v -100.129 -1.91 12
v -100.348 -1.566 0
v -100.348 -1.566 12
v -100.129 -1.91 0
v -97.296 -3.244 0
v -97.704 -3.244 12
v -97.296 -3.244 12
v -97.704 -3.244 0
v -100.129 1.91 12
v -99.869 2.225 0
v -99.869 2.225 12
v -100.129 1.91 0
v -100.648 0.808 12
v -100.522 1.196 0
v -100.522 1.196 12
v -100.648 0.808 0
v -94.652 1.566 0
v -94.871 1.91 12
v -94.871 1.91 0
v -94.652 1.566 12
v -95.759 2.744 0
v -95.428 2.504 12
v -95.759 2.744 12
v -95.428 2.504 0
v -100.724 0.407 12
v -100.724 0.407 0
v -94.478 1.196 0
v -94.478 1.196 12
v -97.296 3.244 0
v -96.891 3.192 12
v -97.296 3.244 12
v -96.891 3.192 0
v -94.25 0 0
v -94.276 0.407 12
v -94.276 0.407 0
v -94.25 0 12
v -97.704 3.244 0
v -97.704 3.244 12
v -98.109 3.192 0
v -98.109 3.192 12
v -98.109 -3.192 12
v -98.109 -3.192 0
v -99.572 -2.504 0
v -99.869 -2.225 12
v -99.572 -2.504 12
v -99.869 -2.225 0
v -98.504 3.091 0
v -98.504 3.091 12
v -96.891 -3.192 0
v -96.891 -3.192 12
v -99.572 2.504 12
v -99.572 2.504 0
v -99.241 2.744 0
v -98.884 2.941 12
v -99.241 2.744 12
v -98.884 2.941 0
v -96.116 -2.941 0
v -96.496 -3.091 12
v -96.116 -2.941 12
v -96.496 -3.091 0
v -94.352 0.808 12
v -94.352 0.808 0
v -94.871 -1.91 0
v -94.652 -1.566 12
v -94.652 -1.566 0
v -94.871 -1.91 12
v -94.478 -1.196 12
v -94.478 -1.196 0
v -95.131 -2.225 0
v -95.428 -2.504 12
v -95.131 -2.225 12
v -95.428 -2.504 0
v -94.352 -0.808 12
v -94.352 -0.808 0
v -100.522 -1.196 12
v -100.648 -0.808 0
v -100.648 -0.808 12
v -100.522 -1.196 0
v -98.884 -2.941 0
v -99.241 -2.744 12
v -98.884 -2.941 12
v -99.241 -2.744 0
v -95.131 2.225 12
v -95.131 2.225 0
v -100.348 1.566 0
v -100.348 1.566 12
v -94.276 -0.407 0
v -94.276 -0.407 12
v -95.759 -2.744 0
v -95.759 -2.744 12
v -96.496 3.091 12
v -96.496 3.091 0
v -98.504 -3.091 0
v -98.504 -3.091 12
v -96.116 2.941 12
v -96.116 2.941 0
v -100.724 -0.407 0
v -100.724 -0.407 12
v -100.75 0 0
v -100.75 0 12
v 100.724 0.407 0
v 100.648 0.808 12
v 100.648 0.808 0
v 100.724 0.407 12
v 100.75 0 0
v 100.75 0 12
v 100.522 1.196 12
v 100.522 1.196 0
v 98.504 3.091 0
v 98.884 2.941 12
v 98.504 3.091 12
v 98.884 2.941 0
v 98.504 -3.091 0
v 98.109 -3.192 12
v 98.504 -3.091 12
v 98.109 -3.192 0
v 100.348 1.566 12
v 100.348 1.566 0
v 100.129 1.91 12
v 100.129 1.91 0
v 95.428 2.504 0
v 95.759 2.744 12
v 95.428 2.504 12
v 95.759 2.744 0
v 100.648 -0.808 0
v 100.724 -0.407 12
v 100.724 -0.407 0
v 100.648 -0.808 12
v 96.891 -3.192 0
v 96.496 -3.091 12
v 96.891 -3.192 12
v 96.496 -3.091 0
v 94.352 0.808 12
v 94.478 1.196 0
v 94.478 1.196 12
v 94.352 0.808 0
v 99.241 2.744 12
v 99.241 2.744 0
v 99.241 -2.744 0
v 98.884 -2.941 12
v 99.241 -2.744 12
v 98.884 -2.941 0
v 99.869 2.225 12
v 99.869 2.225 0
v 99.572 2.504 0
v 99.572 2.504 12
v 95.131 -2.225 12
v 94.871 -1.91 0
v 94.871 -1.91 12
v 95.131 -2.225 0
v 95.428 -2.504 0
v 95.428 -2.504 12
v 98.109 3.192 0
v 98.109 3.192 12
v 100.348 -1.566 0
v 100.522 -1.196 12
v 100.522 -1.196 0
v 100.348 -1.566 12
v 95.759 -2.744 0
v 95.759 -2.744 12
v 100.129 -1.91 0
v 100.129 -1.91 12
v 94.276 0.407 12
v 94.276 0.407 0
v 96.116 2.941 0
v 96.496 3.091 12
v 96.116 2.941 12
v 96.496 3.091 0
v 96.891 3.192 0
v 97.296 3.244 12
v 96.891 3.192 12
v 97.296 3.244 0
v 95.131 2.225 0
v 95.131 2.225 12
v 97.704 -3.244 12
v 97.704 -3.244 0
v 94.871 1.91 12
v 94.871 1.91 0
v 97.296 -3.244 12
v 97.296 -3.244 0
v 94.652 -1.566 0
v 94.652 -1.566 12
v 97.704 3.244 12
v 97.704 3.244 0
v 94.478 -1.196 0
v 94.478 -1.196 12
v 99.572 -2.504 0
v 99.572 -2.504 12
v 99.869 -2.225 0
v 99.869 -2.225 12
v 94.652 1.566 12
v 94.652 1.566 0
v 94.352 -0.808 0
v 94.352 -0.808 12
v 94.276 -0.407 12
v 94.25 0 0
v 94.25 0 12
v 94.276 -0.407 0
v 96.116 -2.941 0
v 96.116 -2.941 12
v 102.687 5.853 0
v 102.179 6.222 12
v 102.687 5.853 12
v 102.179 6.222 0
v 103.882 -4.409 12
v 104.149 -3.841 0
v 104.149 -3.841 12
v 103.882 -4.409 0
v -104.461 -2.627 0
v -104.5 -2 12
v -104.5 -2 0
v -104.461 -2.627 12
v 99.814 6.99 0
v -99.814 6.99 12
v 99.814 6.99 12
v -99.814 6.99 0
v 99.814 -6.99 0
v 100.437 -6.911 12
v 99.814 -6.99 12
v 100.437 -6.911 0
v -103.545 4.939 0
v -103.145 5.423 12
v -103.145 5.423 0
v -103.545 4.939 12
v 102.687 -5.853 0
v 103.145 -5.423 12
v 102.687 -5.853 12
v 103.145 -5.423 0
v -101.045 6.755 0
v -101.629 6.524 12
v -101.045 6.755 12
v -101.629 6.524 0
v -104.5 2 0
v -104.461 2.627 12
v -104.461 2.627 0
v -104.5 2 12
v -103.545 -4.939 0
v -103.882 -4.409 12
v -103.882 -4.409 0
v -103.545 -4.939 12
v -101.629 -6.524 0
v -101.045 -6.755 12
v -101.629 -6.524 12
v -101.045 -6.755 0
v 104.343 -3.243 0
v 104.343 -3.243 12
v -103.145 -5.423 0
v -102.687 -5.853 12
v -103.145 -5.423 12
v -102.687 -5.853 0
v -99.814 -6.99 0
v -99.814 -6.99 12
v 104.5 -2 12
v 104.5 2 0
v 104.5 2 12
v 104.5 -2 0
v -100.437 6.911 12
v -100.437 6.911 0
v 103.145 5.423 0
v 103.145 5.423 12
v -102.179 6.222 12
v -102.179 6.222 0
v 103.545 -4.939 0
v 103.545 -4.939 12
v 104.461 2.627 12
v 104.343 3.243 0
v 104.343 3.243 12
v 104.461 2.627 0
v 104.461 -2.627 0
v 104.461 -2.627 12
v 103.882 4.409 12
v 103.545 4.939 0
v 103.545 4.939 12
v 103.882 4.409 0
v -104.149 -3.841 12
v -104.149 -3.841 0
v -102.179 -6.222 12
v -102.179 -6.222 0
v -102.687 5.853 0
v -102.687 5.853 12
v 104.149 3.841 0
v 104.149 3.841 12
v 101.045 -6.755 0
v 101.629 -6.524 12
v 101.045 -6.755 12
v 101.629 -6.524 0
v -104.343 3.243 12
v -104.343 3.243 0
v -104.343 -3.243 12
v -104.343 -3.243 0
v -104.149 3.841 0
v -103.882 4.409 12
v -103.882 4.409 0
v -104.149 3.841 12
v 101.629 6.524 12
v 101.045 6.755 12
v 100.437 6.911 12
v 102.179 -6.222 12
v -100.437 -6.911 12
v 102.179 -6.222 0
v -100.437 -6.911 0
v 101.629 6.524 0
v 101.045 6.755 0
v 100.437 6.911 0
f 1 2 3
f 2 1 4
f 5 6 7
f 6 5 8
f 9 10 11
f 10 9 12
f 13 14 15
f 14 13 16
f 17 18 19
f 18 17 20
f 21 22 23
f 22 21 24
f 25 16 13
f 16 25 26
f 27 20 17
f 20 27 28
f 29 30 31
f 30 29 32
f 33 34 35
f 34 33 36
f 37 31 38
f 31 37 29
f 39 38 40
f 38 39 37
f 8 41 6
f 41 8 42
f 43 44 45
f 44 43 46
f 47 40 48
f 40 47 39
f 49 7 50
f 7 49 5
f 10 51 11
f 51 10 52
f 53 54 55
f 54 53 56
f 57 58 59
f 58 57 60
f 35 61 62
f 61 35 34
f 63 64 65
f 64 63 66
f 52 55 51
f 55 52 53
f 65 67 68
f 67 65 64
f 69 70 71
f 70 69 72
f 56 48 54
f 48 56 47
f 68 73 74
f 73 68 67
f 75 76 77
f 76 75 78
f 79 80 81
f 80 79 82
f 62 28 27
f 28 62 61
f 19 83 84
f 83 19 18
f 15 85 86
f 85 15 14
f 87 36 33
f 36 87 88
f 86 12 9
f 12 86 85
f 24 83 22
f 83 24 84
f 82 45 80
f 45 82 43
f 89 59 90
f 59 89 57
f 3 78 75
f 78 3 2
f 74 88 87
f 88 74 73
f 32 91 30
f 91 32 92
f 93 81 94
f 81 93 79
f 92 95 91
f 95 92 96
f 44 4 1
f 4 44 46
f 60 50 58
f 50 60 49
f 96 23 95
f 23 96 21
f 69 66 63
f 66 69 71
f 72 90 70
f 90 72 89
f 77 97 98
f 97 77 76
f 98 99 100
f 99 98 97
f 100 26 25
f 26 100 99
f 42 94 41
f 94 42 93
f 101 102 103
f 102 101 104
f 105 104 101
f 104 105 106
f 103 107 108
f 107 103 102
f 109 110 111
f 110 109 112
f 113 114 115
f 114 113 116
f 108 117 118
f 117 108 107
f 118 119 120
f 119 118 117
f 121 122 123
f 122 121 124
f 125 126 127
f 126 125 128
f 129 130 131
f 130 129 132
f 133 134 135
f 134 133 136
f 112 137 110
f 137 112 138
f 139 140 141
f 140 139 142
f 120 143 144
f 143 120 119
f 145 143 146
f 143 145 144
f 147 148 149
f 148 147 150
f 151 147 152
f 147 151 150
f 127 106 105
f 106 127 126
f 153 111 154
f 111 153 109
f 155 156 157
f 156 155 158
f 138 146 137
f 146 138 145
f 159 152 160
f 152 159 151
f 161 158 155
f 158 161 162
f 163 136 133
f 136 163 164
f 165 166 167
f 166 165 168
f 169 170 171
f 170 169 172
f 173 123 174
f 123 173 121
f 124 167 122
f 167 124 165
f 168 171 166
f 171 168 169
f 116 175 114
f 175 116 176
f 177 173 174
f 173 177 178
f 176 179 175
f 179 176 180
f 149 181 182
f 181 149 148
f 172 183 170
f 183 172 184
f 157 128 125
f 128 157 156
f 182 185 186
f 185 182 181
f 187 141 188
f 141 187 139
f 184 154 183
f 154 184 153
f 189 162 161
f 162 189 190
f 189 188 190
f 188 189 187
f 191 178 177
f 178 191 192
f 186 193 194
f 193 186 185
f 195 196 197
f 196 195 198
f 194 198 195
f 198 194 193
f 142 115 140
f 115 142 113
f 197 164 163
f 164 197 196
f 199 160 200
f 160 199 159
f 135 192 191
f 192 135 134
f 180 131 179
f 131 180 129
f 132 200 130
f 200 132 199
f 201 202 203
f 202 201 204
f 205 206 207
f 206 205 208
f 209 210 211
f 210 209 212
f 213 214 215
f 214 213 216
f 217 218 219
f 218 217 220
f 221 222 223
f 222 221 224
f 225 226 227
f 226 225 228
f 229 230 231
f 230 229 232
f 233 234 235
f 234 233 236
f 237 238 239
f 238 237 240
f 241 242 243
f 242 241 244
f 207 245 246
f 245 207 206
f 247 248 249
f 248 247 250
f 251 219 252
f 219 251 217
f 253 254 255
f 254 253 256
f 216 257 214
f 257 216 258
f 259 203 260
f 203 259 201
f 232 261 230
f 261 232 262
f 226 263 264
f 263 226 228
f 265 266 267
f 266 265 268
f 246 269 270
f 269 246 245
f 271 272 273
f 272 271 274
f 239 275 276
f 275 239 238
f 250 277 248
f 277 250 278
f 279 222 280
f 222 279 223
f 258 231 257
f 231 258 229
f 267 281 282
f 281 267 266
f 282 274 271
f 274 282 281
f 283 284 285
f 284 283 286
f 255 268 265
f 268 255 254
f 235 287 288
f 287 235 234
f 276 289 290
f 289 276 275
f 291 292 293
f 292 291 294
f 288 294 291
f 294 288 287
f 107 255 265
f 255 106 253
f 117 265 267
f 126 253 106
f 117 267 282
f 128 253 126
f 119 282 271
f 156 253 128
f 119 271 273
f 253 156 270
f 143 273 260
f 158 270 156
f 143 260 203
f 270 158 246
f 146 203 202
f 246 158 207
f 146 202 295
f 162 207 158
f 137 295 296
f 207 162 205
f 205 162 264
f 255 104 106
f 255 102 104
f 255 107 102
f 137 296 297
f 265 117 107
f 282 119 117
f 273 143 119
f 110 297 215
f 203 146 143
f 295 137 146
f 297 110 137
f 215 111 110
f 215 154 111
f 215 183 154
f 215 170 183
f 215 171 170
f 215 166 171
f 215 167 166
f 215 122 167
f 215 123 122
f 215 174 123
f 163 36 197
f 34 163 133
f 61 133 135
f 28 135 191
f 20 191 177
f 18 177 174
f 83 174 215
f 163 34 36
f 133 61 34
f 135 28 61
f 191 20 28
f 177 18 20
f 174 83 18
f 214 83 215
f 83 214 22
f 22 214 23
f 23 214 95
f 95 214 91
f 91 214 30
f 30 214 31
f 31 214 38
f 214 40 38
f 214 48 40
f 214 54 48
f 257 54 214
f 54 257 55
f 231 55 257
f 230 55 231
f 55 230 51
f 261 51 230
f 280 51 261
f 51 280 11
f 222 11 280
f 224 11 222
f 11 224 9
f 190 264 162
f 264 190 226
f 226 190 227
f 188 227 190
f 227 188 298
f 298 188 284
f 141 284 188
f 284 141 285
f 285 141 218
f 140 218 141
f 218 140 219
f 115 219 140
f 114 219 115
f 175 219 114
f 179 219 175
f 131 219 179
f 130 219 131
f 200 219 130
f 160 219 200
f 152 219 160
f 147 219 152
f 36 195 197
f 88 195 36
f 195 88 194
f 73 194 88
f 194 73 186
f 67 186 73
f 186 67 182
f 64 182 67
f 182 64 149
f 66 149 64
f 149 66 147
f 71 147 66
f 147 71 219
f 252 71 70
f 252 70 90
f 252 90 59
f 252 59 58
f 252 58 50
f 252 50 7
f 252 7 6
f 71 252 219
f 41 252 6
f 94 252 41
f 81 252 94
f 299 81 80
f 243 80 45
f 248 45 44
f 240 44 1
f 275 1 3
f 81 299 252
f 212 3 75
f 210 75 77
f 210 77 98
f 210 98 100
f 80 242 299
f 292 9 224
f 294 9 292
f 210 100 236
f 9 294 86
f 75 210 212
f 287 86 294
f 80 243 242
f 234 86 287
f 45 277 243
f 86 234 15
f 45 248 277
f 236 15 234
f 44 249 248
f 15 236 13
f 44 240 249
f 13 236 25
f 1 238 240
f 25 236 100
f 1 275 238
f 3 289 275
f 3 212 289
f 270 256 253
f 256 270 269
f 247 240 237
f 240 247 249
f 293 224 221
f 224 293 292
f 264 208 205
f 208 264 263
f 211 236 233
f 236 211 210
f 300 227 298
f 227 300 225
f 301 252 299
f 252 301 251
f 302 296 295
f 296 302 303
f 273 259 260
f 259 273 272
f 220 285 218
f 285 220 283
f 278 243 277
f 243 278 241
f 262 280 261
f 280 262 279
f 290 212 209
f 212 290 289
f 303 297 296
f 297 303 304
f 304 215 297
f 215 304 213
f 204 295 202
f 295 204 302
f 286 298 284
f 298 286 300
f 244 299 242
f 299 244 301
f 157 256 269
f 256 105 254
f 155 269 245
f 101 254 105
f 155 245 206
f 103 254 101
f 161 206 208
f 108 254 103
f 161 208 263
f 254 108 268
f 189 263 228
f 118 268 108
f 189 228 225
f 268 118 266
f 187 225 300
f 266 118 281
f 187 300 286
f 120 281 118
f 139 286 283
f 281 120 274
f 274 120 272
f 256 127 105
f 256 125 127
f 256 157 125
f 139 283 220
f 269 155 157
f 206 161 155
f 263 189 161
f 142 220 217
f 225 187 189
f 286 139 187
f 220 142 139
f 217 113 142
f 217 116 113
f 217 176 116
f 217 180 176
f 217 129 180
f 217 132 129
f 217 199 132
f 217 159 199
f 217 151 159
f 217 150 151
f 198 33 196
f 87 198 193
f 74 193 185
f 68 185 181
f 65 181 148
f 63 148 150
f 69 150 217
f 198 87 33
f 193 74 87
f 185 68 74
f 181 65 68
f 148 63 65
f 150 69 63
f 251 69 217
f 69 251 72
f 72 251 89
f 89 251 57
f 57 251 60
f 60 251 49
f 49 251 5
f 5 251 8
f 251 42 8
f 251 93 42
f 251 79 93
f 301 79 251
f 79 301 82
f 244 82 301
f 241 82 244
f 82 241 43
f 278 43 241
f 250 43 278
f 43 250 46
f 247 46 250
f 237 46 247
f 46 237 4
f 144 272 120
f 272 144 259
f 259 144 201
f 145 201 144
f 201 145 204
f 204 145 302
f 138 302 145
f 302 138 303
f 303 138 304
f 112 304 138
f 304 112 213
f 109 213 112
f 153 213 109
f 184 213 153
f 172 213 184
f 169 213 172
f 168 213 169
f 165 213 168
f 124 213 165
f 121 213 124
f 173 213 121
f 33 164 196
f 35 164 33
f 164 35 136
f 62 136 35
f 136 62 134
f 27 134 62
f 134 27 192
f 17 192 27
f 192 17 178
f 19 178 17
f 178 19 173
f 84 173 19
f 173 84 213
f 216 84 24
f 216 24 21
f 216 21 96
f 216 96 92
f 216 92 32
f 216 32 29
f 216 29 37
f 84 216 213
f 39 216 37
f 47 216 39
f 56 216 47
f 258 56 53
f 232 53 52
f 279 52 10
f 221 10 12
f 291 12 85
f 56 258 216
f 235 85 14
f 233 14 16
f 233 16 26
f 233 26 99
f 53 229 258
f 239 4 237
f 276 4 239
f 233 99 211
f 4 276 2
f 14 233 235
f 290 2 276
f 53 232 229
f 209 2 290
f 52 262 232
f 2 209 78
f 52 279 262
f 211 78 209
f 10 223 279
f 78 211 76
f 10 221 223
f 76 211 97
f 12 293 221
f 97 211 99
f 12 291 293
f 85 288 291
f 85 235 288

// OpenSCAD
$fn = 50;


difference() {
	union() {
		hull() {
			translate(v = [-99.5000000000, 2.0000000000, 0]) {
				cylinder(h = 12, r = 5);
			}
			translate(v = [99.5000000000, 2.0000000000, 0]) {
				cylinder(h = 12, r = 5);
			}
			translate(v = [-99.5000000000, -2.0000000000, 0]) {
				cylinder(h = 12, r = 5);
			}
			translate(v = [99.5000000000, -2.0000000000, 0]) {
				cylinder(h = 12, r = 5);
			}
		}
	}
	union() {
		translate(v = [-97.5000000000, 0.0000000000, -100.0000000000]) {
			cylinder(h = 200, r = 3.2500000000);
		}
		translate(v = [-97.5000000000, 0.0000000000, -100.0000000000]) {
			cylinder(h = 200, r = 3.2500000000);
		}
		translate(v = [97.5000000000, 0.0000000000, -100.0000000000]) {
			cylinder(h = 200, r = 3.2500000000);
		}
		translate(v = [97.5000000000, 0.0000000000, -100.0000000000]) {
			cylinder(h = 200, r = 3.2500000000);
		}
	}
}
